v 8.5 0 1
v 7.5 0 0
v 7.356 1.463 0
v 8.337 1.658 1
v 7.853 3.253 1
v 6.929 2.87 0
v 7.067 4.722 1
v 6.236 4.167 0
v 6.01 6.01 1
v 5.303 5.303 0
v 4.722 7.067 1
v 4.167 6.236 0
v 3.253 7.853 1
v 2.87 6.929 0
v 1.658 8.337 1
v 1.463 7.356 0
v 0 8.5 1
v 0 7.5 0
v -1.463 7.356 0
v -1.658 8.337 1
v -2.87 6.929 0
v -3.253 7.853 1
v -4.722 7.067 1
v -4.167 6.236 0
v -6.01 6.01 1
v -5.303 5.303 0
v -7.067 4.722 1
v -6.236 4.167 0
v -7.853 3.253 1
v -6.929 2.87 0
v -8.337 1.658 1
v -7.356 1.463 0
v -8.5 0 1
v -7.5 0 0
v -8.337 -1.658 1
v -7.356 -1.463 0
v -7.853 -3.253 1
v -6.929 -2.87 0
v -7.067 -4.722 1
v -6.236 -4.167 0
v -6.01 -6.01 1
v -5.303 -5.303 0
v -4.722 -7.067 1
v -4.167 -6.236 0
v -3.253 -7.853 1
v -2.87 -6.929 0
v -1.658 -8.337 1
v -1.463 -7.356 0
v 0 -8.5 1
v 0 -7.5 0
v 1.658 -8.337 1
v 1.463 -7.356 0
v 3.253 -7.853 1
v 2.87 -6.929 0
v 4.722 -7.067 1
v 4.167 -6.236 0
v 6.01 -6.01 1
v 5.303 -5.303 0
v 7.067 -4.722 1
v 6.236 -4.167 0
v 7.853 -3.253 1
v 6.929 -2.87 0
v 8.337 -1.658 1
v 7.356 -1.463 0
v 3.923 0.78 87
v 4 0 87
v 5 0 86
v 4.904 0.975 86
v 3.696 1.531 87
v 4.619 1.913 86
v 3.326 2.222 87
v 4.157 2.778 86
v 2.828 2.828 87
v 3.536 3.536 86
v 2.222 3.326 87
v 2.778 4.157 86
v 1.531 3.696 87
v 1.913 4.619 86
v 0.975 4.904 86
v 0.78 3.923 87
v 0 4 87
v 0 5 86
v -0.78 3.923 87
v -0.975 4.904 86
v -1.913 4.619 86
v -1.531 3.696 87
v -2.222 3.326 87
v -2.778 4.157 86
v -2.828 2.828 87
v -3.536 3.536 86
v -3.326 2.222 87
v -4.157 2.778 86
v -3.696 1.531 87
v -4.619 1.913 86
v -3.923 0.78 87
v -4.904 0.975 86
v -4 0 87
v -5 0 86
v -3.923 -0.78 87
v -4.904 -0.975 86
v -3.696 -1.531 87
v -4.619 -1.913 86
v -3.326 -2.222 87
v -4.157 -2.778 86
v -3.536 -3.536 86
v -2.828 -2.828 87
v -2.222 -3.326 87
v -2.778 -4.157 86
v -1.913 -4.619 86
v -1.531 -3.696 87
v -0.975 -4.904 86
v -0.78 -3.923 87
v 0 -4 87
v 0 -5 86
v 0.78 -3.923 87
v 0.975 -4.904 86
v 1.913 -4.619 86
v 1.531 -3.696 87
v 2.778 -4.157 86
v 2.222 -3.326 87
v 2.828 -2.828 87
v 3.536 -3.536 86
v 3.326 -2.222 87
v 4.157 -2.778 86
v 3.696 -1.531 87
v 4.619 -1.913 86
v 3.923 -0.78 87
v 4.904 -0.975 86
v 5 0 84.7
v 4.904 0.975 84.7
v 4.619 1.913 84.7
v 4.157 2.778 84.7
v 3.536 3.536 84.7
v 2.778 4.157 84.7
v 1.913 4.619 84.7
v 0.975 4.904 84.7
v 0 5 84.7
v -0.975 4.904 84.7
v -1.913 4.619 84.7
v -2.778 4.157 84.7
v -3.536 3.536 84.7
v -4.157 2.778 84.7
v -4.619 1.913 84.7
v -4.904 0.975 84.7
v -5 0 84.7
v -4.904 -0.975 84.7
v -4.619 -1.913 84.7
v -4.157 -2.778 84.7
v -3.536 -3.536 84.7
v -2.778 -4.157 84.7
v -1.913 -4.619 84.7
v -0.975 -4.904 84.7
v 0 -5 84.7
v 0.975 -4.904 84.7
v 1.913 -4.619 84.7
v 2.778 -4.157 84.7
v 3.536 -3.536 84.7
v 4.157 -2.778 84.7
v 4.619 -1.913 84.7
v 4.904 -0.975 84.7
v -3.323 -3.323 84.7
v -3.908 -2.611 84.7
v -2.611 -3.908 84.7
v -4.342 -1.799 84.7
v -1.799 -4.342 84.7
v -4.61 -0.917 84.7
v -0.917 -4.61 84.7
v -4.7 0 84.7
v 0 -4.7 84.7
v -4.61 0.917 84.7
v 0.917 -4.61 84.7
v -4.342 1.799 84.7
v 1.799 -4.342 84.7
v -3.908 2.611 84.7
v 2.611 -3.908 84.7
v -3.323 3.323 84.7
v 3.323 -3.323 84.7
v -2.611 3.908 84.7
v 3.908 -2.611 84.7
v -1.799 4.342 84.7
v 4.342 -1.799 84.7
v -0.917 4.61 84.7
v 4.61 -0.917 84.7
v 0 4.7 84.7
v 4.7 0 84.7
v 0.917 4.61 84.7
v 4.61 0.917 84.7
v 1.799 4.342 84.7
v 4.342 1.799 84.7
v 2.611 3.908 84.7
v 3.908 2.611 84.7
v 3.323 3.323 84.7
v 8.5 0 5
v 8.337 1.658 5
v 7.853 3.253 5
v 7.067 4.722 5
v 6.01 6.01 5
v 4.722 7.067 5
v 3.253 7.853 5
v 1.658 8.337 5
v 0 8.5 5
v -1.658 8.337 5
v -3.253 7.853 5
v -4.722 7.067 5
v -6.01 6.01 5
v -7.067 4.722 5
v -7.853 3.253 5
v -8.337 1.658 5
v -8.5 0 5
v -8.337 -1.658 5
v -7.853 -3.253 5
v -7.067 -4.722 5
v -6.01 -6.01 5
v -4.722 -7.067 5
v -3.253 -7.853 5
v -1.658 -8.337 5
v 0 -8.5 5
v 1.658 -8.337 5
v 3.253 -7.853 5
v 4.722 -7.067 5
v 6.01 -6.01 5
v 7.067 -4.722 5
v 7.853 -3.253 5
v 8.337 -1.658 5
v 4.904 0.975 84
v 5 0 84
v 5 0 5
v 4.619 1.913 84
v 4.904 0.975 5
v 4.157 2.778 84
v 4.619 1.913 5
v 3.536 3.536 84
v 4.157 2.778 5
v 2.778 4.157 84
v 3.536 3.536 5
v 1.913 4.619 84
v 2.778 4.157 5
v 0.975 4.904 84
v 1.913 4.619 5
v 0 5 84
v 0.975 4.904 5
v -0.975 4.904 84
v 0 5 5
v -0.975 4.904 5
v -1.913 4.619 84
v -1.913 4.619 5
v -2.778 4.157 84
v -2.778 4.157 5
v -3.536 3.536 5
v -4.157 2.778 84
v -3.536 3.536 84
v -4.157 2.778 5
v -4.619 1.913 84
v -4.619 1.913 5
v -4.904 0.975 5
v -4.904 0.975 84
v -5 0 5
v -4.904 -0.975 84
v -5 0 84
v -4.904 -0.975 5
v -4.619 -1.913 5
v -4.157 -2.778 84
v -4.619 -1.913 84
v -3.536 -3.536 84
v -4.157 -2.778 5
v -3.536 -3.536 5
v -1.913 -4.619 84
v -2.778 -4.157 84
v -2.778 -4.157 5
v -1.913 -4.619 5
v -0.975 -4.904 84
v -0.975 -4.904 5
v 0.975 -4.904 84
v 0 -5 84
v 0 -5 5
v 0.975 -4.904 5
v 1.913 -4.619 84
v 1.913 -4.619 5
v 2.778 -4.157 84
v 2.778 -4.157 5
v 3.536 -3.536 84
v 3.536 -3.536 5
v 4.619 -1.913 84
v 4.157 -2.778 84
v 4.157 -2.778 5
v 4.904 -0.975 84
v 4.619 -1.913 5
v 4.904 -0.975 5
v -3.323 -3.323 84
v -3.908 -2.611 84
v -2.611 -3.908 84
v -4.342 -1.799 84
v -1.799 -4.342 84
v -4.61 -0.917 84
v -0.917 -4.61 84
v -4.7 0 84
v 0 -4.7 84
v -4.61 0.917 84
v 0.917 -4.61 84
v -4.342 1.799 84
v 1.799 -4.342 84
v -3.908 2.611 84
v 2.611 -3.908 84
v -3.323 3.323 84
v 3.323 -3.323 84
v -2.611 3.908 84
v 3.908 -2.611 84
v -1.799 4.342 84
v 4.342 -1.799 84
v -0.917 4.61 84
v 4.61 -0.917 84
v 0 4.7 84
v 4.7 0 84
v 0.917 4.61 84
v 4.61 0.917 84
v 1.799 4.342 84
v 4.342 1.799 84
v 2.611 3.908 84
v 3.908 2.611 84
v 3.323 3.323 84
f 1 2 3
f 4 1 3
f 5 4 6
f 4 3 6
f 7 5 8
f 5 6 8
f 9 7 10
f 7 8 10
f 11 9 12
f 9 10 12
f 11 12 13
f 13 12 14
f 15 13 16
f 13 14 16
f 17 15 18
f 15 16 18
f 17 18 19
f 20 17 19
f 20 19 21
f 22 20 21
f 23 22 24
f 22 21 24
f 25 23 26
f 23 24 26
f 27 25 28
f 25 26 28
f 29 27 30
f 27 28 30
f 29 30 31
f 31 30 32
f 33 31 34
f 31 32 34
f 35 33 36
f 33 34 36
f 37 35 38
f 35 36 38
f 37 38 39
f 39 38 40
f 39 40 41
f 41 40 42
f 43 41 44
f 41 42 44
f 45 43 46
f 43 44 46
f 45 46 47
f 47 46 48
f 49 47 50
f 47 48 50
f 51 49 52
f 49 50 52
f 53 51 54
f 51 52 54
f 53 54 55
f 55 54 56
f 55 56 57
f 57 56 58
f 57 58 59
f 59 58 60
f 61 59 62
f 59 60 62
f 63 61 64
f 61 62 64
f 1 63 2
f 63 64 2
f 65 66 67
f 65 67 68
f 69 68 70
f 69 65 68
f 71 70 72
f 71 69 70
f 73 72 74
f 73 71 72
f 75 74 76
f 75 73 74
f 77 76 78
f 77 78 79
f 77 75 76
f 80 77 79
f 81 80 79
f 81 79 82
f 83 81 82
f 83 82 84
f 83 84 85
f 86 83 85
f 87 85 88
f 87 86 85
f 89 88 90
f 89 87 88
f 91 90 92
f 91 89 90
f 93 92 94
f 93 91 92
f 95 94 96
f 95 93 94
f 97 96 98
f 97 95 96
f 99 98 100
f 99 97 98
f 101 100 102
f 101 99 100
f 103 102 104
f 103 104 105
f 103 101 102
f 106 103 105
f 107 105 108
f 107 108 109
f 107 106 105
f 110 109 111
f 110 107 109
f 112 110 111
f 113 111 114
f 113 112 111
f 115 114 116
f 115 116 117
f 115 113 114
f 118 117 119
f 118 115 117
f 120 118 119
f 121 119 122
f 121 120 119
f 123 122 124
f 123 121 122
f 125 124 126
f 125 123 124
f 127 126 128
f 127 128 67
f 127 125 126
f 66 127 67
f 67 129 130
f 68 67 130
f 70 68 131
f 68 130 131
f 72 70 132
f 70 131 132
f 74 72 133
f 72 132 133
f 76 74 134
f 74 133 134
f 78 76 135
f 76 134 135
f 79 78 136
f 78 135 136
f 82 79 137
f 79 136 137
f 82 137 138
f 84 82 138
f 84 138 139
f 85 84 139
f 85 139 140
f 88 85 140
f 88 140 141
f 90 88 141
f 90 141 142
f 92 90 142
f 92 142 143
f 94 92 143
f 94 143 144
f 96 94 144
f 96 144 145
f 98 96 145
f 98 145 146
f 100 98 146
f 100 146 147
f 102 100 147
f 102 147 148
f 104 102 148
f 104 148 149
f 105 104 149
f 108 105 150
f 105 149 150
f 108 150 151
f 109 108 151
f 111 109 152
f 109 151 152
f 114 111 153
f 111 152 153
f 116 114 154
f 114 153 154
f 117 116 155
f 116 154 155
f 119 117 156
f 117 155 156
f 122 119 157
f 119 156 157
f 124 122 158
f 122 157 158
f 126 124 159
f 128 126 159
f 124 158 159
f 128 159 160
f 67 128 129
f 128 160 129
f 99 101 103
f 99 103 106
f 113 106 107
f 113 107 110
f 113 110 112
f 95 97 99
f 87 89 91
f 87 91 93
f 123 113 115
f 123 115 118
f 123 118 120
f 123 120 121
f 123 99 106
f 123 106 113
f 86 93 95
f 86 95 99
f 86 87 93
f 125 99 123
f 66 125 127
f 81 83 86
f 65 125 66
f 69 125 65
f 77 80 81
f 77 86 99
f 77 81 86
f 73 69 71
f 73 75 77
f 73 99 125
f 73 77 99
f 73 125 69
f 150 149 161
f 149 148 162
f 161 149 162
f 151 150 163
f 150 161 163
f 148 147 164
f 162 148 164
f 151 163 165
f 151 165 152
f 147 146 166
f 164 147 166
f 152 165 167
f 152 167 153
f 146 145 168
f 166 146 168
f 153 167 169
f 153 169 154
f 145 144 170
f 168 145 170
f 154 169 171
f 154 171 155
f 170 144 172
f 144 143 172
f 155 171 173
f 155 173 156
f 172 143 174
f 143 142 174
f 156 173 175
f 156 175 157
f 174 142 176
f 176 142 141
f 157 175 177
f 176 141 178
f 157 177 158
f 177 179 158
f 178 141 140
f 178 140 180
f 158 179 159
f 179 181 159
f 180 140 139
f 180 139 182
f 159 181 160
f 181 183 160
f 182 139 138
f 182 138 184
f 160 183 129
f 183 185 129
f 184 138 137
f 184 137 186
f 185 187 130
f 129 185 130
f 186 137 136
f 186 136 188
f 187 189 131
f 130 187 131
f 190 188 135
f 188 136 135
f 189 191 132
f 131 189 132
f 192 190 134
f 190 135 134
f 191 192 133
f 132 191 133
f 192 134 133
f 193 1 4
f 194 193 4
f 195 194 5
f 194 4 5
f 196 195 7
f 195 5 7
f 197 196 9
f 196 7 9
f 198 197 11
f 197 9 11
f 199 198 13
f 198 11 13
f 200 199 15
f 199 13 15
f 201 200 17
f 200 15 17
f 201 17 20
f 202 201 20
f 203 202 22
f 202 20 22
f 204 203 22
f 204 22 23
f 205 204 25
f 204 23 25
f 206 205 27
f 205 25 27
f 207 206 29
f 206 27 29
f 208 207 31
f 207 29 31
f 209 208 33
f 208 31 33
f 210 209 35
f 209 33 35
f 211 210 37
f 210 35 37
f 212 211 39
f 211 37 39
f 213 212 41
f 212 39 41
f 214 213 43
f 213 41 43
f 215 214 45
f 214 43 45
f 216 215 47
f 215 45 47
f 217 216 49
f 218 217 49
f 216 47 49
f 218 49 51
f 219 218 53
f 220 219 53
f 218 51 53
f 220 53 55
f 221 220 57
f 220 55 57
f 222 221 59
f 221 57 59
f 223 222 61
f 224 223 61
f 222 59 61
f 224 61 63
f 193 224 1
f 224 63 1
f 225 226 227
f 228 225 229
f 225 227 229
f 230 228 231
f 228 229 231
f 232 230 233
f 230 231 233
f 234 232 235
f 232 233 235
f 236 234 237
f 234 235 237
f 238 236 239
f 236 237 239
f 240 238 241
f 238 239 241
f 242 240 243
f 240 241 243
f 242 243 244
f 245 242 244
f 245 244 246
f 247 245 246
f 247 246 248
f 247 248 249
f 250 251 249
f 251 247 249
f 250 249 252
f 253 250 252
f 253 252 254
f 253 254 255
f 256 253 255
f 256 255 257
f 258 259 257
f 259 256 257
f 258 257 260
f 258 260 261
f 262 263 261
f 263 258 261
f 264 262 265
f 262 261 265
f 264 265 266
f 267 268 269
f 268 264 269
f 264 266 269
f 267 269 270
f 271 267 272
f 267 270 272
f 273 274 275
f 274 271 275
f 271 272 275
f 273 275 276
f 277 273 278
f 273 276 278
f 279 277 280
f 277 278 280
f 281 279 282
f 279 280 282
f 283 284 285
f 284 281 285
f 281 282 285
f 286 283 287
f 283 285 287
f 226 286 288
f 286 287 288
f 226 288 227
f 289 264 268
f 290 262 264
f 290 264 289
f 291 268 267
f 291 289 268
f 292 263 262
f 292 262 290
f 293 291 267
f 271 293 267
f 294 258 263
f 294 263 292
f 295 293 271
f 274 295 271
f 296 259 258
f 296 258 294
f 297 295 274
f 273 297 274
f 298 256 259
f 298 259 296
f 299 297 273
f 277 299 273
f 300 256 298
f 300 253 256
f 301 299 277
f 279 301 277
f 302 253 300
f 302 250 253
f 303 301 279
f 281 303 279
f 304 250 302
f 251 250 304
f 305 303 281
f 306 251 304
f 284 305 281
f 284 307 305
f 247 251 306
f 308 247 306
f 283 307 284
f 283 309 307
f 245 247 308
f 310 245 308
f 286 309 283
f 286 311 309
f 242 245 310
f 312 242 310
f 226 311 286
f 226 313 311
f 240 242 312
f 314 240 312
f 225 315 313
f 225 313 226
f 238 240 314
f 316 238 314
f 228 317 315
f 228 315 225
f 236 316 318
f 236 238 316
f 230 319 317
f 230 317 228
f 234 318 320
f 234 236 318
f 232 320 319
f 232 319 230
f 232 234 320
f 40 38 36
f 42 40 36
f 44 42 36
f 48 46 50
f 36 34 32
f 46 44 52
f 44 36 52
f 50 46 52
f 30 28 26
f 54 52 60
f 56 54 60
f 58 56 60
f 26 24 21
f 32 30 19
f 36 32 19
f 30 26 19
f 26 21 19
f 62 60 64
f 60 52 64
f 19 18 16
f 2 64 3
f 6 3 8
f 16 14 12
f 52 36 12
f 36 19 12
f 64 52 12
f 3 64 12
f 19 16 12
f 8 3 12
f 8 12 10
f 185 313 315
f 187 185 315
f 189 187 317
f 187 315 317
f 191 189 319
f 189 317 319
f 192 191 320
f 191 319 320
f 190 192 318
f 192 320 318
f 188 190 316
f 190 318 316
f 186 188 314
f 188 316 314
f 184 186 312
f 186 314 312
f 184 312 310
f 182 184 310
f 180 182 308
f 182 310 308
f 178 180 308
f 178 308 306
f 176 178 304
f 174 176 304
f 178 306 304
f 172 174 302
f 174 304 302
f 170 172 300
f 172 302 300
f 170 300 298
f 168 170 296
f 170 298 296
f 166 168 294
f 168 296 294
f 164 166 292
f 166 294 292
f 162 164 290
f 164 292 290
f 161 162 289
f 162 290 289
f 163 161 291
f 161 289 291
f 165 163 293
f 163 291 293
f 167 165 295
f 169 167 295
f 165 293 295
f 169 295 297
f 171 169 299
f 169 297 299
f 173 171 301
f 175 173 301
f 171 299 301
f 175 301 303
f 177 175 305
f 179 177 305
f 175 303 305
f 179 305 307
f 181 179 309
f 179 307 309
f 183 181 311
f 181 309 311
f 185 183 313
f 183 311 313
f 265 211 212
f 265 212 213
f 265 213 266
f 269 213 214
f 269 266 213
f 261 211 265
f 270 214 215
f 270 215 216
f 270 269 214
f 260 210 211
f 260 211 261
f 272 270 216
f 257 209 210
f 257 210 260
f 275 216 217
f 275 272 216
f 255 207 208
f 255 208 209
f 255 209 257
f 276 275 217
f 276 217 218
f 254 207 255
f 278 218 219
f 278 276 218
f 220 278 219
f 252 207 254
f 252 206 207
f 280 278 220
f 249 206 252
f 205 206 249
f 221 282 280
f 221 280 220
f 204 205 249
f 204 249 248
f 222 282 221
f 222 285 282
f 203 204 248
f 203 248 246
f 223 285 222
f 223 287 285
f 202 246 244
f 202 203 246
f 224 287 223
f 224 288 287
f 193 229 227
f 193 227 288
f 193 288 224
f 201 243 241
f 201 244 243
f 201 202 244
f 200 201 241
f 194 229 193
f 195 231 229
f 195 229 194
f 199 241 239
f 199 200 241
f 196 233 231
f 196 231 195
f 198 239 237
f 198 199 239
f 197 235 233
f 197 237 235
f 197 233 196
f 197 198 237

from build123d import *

# Parameters (mm, degrees)
SKETCH1_R               = 8.5
BOSS_EXTRUDE1_DEPTH     = 5
SKETCH2_R               = 5
BOSS_EXTRUDE2_DEPTH     = 82
CHAMFER1_SIZE           = 1
SKETCH3_R               = 14.7
SKETCH3_R_2             = 4.7
CUT_EXTRUDE_THIN1_DEPTH = 0.7


with BuildPart() as part:
    # Sketch1 → Boss-Extrude1 (new body)
    with BuildSketch(Plane.XY):
        Circle(SKETCH1_R)
    extrude(amount=BOSS_EXTRUDE1_DEPTH)

    # Sketch2 → Boss-Extrude2 (add)
    with BuildSketch(Plane.XY.offset(5)):
        Circle(SKETCH2_R)
    extrude(amount=BOSS_EXTRUDE2_DEPTH)

    # Chamfer1
    chamfer1_edges = [part.edges().sort_by_distance(p)[0] for p in [
        (-8.5, 0, 0),
        (-5, 0, 87),
    ]]
    chamfer(chamfer1_edges, length=CHAMFER1_SIZE)

    # Sketch3 → Cut-Extrude-Thin1 (cut)
    with BuildSketch(Plane.XY.offset(84)):
        Circle(SKETCH3_R)
        Circle(SKETCH3_R_2, mode=Mode.SUBTRACT)
    extrude(amount=CUT_EXTRUDE_THIN1_DEPTH, mode=Mode.SUBTRACT)


solid = part.part
